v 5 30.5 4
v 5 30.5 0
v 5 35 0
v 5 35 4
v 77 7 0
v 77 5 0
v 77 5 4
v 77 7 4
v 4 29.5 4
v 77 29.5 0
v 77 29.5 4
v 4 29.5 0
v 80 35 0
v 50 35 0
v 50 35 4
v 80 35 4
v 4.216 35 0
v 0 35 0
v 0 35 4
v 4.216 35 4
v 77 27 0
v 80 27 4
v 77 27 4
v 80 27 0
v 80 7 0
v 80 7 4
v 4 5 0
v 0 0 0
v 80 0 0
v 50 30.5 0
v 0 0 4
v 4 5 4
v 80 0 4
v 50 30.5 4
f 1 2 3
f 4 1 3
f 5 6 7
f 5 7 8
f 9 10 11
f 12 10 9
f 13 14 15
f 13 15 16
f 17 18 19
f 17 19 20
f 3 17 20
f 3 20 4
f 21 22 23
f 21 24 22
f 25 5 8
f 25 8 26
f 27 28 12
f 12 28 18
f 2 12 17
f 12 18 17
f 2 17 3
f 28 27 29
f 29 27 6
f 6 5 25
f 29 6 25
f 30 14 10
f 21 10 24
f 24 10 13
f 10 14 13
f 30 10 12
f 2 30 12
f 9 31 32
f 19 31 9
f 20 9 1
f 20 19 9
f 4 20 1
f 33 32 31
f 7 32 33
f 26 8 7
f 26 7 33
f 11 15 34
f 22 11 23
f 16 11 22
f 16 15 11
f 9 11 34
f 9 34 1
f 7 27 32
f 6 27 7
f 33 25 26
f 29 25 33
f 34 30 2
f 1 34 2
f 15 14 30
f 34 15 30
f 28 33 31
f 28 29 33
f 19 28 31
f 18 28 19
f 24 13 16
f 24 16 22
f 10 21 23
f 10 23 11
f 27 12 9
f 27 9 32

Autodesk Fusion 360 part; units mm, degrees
sketch "Sketch1" plane through (0, 0, 0) normal (0, 0, 1) x (1, 0, 0)
  line L0 (0, 0) -> (0, 35)
  line L1 (0, 35) -> (80, 35)
  line L2 (80, 35) -> (80, 27)
  line L3 (80, 27) -> (77, 27)
  line L4 (77, 27) -> (77, 29.5)
  line L5 (77, 29.5) -> (4, 29.5)
  line L6 (4, 29.5) -> (4, 5)
  line L7 (4, 5) -> (77, 5)
  line L8 (77, 5) -> (77, 7)
  line L9 (77, 7) -> (80, 7)
  line L10 (80, 7) -> (80, 0)
  line L11 (80, 0) -> (0, 0)
  line L12 (4.2162, 35) -> (5, 35)
  line L13 (4, 32) -> (4.2162, 32)
  line L14 (5, 35) -> (50, 35)
  line L15 (50, 35) -> (50, 30.5)
  line L16 (50, 30.5) -> (5, 30.5)
  line L17 (5, 30.5) -> (5, 35)
  dimension "d3" = 35
  dimension "d4" = 5
  dimension "d5" = 5.5
  dimension "d6" = 3
  dimension "d7" = 3
  dimension "d8" = 8
  dimension "d9" = 7
  dimension "d10" = 4
  dimension "d11" = 80
  dimension "d12" = 80
  dimension "d13" = 45
  dimension "d14" = 5
  dimension "d15" = 4.5
extrude "Extrude1" add sketch "Sketch1" along normal blind 4 contours L0 L1 L2 L3 L4 L5 L6 L7 L8 L9 L10 L11 L12 L15 L16 L17
